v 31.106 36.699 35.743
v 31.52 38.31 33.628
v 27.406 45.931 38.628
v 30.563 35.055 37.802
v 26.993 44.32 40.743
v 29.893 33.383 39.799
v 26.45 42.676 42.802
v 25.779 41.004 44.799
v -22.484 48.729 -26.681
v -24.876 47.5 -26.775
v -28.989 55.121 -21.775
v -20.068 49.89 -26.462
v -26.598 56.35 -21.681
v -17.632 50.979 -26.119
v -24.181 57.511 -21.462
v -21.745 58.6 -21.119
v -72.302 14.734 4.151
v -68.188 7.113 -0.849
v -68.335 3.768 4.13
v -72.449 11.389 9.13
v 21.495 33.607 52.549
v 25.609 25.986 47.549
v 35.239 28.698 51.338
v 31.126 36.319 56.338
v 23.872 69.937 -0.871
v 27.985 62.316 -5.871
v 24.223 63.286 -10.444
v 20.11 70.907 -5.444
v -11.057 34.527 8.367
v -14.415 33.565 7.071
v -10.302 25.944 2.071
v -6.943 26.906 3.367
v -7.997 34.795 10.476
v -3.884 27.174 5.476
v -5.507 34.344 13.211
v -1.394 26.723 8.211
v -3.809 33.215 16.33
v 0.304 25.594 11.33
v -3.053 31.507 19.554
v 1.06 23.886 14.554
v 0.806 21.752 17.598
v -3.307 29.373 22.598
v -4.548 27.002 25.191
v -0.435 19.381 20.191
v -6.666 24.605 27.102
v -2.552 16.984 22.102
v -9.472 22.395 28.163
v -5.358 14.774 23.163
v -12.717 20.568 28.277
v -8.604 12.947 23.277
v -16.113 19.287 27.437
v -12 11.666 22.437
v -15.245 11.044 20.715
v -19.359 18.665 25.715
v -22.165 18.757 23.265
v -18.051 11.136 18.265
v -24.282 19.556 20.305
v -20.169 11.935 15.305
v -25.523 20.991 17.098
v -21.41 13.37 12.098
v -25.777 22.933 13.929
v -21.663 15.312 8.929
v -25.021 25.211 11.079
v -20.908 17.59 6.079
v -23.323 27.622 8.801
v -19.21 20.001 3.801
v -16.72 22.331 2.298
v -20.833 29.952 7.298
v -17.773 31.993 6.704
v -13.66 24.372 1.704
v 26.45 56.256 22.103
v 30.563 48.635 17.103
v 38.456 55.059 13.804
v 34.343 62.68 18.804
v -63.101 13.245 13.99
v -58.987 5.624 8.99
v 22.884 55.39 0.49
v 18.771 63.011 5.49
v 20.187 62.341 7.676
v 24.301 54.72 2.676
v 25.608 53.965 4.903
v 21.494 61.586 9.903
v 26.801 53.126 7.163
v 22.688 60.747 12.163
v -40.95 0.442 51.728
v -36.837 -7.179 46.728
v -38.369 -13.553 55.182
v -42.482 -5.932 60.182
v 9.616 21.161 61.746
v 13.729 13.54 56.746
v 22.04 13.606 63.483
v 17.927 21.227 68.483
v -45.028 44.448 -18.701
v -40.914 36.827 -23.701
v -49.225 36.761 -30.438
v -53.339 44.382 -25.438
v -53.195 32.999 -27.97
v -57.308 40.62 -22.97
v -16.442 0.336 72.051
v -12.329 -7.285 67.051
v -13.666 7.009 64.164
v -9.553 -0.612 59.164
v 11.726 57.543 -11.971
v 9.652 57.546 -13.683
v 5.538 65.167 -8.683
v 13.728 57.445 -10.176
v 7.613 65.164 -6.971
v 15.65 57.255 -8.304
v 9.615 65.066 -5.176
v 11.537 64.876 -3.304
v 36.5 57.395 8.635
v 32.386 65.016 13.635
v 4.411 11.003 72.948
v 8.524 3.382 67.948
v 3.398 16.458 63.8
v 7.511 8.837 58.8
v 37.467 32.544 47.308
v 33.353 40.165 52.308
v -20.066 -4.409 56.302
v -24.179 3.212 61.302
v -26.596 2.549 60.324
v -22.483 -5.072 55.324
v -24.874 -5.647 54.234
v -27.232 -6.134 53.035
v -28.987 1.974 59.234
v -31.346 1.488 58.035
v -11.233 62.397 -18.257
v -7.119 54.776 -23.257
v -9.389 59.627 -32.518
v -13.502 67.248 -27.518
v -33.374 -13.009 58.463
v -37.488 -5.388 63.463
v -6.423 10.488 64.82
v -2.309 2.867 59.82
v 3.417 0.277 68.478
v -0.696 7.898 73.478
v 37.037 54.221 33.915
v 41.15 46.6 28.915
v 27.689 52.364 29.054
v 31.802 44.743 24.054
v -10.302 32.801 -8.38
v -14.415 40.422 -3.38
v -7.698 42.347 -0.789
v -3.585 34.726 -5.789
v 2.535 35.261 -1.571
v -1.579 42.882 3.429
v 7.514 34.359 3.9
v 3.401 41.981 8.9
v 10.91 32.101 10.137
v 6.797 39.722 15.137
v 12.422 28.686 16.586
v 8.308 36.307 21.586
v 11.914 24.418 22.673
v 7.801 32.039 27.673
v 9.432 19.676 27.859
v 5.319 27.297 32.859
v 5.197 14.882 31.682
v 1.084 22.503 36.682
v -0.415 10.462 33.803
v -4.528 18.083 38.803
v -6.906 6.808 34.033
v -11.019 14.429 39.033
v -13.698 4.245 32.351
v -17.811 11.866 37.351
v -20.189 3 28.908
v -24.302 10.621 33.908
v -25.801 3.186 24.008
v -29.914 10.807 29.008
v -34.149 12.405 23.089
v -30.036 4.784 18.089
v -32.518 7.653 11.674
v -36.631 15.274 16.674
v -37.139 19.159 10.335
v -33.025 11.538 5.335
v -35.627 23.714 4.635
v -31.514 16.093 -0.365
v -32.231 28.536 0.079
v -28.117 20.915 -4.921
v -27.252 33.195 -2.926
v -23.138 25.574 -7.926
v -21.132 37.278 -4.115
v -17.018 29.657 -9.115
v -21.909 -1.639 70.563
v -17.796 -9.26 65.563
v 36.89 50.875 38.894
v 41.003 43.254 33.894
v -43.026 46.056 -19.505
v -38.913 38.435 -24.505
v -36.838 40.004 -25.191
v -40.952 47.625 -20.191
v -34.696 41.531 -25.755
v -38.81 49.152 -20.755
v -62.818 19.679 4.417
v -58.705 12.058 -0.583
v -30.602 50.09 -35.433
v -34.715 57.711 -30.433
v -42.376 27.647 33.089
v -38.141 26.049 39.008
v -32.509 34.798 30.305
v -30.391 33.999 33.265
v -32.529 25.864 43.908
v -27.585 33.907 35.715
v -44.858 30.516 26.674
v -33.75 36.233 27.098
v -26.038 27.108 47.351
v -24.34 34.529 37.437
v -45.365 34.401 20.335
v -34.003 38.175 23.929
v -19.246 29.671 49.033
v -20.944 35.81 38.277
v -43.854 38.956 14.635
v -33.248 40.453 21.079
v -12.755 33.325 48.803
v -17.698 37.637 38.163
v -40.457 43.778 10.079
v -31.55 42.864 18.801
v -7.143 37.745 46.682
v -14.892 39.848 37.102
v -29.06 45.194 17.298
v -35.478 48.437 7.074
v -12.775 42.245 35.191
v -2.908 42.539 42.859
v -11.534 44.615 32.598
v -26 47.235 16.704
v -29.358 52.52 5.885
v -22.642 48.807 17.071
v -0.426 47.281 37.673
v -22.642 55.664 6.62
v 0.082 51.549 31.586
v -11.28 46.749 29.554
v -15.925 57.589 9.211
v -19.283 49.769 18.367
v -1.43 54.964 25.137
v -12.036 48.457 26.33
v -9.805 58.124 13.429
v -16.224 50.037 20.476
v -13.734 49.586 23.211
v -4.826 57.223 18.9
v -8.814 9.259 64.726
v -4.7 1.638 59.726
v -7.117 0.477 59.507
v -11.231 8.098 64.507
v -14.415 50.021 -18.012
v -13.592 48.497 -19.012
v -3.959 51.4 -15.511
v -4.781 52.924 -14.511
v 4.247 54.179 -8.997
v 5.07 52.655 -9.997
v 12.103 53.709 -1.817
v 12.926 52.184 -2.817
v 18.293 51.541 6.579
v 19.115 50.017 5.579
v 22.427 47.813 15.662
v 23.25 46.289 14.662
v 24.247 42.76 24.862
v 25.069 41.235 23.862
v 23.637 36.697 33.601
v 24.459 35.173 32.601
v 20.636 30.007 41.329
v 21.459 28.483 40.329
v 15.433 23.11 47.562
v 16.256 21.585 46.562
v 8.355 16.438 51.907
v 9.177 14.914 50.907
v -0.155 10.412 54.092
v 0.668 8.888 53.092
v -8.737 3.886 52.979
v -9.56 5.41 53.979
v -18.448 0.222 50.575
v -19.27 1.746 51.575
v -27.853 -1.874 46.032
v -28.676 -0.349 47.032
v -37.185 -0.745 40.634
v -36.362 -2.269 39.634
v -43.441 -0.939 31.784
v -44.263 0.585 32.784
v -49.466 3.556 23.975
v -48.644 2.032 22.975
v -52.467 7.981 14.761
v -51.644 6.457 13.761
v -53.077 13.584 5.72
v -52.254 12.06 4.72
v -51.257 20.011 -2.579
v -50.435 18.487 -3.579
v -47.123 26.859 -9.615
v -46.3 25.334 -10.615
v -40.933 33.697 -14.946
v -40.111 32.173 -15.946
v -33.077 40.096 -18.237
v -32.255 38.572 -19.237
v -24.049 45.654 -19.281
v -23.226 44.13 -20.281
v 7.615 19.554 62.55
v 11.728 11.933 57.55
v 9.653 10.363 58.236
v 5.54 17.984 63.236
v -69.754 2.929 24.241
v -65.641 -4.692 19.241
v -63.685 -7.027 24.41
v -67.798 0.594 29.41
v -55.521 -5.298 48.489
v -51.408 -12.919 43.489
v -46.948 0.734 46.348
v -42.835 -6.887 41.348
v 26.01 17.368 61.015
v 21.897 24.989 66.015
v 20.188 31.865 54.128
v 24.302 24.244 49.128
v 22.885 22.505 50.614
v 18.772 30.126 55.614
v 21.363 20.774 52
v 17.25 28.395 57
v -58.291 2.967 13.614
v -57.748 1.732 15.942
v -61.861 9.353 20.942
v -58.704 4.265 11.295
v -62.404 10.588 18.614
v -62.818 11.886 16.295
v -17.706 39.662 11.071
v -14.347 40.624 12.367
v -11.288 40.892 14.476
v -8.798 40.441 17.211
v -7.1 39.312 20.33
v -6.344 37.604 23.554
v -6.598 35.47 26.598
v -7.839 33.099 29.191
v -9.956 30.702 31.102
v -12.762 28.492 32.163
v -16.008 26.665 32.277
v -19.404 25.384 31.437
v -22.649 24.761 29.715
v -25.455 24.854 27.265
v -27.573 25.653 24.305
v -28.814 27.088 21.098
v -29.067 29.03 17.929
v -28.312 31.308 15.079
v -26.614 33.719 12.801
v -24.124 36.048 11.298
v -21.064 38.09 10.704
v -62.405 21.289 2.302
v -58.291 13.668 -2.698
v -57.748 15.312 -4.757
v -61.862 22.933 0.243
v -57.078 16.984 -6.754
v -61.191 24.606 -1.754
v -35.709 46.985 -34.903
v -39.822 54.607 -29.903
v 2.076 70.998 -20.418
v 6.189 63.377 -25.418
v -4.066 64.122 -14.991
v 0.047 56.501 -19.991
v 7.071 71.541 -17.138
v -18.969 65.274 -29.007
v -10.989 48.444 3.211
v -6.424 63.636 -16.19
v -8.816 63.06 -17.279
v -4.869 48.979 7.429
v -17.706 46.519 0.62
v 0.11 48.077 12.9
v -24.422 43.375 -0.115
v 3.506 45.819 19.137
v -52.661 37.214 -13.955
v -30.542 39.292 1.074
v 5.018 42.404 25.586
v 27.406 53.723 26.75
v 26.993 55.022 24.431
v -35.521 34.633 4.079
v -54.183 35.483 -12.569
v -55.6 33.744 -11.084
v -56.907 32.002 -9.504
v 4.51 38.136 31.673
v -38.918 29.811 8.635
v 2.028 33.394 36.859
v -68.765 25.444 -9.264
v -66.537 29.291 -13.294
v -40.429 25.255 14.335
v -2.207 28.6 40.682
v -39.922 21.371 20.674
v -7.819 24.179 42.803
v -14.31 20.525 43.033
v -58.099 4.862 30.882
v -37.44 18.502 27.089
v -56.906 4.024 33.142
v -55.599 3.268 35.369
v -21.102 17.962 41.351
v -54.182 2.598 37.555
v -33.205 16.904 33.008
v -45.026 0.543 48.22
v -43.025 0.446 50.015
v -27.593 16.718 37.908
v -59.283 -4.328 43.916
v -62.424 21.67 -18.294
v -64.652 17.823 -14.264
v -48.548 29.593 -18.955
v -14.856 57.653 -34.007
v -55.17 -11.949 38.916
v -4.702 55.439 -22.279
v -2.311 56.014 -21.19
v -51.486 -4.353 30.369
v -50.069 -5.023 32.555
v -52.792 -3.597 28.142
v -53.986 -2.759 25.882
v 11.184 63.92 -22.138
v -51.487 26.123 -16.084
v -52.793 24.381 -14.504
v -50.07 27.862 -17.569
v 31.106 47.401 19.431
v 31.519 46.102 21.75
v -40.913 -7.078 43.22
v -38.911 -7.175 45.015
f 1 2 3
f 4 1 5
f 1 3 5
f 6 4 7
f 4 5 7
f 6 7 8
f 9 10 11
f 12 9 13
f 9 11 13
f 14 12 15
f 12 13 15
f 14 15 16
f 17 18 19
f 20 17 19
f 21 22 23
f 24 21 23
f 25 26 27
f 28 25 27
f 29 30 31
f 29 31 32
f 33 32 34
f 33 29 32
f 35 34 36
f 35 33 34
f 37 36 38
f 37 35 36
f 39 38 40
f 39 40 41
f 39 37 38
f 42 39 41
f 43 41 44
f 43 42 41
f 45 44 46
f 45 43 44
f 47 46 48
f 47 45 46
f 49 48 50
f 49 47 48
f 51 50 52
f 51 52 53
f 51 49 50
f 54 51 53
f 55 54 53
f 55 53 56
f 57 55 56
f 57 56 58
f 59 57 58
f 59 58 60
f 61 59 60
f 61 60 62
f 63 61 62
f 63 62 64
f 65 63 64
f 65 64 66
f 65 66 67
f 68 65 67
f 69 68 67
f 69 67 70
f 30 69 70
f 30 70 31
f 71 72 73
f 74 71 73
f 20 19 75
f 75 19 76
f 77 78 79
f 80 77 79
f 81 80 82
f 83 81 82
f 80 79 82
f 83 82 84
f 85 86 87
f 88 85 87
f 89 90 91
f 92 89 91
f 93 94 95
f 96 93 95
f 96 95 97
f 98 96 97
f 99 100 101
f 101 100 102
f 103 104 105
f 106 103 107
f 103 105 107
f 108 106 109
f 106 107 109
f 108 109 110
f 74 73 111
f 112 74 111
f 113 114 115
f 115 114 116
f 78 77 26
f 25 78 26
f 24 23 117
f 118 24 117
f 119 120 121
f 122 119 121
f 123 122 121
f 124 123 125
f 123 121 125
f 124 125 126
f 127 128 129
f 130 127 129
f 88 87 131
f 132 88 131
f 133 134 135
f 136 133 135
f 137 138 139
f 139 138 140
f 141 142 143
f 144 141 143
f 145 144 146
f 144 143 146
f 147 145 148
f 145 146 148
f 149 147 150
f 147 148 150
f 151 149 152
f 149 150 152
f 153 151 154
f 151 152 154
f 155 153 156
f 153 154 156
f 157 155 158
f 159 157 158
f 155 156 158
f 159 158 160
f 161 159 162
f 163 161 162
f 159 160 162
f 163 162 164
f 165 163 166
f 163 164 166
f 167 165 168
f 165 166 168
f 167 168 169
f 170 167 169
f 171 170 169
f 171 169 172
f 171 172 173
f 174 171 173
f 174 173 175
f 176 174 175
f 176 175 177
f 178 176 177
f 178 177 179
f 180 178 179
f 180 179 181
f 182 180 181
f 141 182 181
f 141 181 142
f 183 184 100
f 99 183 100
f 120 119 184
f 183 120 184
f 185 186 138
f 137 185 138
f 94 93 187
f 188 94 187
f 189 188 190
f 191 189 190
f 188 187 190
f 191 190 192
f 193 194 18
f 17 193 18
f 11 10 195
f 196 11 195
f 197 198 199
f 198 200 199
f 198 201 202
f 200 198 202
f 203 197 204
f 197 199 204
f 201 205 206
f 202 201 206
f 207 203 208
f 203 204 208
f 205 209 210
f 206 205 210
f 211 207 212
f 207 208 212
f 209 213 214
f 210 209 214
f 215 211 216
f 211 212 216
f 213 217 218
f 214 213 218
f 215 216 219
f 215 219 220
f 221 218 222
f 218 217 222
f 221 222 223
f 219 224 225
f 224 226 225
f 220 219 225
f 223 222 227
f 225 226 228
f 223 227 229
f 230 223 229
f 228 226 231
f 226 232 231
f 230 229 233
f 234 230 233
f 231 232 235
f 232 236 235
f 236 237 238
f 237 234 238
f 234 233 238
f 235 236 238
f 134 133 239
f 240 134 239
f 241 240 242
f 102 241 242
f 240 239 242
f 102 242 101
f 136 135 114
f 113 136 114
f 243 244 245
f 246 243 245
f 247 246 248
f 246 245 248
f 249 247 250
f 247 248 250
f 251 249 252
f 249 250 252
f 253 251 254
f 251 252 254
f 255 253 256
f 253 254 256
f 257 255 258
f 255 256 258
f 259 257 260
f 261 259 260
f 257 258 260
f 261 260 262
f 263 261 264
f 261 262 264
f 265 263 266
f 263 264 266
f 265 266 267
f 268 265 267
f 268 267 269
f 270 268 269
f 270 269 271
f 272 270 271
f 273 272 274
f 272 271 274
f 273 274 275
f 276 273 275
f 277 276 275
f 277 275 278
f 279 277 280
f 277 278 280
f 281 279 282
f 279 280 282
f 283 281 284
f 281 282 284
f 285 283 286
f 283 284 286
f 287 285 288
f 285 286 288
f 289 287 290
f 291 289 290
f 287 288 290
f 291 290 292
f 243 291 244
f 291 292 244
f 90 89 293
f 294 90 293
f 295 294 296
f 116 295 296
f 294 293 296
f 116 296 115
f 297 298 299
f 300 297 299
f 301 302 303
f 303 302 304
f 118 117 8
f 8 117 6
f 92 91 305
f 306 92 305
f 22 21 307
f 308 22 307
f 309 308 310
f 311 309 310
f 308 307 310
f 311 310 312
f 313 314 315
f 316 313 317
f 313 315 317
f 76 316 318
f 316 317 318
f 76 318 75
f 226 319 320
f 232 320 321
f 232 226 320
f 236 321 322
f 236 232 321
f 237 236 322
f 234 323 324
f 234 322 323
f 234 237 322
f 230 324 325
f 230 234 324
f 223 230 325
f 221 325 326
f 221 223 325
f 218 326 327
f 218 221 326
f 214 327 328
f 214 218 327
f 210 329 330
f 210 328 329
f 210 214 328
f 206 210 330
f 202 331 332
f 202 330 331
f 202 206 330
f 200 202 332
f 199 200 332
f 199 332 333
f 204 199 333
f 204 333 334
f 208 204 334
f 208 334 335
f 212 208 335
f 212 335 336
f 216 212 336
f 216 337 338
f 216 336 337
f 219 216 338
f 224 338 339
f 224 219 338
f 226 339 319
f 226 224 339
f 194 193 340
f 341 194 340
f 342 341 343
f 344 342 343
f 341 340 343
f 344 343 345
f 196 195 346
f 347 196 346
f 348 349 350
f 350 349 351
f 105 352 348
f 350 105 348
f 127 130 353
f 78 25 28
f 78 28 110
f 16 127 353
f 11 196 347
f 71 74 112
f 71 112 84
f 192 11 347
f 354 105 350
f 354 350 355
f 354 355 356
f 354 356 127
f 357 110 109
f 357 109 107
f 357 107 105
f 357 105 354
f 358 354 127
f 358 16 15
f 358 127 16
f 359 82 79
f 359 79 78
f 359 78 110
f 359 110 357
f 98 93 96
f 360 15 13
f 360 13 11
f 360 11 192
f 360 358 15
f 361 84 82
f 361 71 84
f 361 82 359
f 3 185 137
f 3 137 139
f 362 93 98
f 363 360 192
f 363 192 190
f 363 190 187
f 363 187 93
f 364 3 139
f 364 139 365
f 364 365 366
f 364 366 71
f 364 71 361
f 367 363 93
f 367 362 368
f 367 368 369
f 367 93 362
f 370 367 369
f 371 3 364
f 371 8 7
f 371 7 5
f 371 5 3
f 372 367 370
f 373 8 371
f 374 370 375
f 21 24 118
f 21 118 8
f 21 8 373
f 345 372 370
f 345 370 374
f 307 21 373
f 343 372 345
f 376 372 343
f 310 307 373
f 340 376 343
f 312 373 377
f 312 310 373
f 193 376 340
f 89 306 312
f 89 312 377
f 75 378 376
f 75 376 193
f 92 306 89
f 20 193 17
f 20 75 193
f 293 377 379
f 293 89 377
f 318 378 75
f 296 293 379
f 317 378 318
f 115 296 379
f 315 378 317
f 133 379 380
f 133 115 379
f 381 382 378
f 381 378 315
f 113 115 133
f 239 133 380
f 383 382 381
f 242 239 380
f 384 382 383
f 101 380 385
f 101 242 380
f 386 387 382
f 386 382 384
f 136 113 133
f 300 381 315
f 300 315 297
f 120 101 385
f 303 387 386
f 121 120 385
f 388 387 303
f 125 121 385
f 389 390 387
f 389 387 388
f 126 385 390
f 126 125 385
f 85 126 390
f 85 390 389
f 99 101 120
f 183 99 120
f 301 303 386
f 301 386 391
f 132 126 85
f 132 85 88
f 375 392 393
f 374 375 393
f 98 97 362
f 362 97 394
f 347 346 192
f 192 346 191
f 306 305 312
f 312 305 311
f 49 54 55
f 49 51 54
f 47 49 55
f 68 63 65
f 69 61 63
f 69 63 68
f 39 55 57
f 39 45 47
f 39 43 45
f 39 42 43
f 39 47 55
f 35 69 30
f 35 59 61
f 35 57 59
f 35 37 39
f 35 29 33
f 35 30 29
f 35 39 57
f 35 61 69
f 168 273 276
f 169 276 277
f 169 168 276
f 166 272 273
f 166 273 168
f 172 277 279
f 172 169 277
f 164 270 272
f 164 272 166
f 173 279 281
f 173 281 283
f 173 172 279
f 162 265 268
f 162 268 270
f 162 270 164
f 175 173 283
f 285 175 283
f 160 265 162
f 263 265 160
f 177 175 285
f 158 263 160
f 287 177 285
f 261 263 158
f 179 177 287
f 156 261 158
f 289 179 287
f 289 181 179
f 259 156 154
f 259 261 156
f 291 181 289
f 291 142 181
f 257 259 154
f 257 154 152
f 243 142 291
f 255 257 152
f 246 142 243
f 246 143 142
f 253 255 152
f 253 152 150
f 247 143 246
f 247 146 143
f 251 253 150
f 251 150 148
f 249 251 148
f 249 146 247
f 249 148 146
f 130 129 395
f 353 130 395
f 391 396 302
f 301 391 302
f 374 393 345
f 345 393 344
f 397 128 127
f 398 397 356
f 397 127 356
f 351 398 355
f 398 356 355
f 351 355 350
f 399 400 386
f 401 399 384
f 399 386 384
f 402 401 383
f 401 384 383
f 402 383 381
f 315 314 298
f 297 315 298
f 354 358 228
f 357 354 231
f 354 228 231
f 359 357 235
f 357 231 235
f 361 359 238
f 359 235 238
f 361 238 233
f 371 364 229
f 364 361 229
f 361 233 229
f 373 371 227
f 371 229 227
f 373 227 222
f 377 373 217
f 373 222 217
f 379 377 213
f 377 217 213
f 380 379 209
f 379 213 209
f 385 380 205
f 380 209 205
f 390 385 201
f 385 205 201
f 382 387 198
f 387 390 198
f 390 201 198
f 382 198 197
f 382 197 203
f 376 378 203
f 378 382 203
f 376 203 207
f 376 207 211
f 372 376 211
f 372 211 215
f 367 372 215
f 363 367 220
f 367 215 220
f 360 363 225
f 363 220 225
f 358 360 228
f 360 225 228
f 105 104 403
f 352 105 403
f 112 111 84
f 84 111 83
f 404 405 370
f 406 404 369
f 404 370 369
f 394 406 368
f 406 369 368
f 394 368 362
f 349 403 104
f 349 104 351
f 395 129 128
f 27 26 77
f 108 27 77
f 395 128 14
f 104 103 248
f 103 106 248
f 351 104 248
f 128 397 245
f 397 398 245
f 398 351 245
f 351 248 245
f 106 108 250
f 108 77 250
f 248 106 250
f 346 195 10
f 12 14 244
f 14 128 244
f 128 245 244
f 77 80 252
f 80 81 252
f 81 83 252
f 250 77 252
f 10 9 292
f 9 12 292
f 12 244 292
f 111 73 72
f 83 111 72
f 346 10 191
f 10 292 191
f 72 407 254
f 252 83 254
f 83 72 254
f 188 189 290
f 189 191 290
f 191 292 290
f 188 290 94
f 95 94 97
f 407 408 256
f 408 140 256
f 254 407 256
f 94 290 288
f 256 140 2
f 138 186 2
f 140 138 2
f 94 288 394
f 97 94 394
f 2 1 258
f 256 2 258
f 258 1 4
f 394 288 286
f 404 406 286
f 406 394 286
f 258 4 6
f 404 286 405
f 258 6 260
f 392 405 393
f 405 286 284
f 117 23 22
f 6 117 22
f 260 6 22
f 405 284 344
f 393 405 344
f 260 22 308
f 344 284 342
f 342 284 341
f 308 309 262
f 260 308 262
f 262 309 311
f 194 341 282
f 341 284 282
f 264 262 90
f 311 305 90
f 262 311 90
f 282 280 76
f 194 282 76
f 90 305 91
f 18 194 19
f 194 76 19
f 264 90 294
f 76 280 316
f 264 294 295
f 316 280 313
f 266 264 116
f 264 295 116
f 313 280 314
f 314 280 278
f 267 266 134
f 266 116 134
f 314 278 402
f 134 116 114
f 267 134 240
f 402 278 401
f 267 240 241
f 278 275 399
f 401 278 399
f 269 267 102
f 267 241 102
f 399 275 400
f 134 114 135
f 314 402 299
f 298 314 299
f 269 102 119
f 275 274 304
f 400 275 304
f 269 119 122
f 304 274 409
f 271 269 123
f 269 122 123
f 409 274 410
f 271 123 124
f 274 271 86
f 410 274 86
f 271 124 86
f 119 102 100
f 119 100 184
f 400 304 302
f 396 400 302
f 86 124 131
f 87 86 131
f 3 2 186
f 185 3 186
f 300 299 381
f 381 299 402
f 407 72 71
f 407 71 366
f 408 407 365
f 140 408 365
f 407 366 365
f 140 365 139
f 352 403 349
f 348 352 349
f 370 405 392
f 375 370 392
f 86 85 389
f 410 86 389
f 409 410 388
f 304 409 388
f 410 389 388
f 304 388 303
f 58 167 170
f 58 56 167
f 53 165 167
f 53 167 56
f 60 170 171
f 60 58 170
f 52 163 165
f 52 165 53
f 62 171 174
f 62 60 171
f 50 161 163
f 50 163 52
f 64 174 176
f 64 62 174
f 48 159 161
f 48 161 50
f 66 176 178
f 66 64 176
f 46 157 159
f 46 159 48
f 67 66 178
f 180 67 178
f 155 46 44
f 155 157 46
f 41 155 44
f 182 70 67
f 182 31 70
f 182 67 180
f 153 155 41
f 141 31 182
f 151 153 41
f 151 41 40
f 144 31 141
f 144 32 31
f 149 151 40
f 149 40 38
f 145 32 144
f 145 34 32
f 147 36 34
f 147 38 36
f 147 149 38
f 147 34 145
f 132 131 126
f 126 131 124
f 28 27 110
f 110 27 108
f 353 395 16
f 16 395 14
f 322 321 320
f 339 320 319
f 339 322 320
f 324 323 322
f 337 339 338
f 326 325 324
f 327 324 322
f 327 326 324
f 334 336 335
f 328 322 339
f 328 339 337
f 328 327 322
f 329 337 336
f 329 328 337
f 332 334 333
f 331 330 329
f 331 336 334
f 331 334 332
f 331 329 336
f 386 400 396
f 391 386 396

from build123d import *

# Parameters (mm, degrees)
SKETCH1_R           = 50
EXTRUDE1_DEPTH      = 10
EXTRUDE2_DEPTH      = 10
CIRPATTERN1_COUNT   = 16
SKETCH3_R           = 42.5
CUT_EXTRUDE1_DEPTH  = 2
EXTRUDE3_DEPTH      = 10
EXTRUDE3_DEPTH_BACK = 20
SKETCH4_R           = 25
SKETCH4_R_2         = 12.5


with BuildPart() as part:
    # Sketch1 → Extrude1 (new body)
    with BuildSketch(Plane(origin=(-35.411572528, 65.609323585, -43.044793763), x_dir=(0.661608716570187, 0.6269595397180289, -0.4113339783131309), z_dir=(0.411333978313131, -0.7621052147079792, -0.49999999999999767))):
        with Locations(Location((-35.411572528, 65.609323585, 0), (0, 0, 313.459706489))):
            Circle(SKETCH1_R)
    extrude(amount=EXTRUDE1_DEPTH)

    # Sketch2 → Extrude2 (add)
    with BuildSketch(Plane(origin=(-13.592446481, 25.183609646, 16.522396881), x_dir=(0.661608716570187, 0.6269595397180289, -0.4113339783131309), z_dir=(0.4113339783131311, -0.7621052147079793, -0.4999999999999976))):
        Polygon((-3, 60), (3, 60), (8.358983849, 40), (-8.358983849, 40), align=None)
    extrude2 = extrude(amount=-EXTRUDE2_DEPTH)

    # CirPattern1: Extrude2 ×16 about axis
    cirpattern1_axis = Axis((0, 0, 0), (-0.41133397831313073, 0.7621052147079793, 0.4999999999999978))
    for i in range(1, CIRPATTERN1_COUNT):
        add(extrude2.rotate(cirpattern1_axis, i * 360 / CIRPATTERN1_COUNT))

    # Sketch3 → Cut-Extrude1 (cut)
    with BuildSketch(Plane(origin=(-13.592446481, 25.183609646, 16.522396881), x_dir=(0.661608716570187, 0.6269595397180289, -0.4113339783131309), z_dir=(0.4113339783131311, -0.7621052147079793, -0.4999999999999976))):
        with Locations(Location((0, 0, 0), (0, 0, 313.459706489))):
            Circle(SKETCH3_R)
    extrude(amount=-CUT_EXTRUDE1_DEPTH, mode=Mode.SUBTRACT)

    # Sketch4 → Extrude3 (add, two sides: drawn at the far end of the back side and taken through both)
    with BuildSketch(Plane(origin=(-14.415114438, 26.707820075, 17.522396881), x_dir=(0.661608716570187, 0.626959539718029, -0.41133397831313107), z_dir=(0.4113339783131311, -0.7621052147079793, -0.49999999999999756)).offset(-EXTRUDE3_DEPTH_BACK)):
        with Locations(Location((0, 0, 0), (0, 0, 313.459706489))):
            Circle(SKETCH4_R)
        with Locations(Location((0, 0, 0), (0, 0, 313.459706489))):
            Circle(SKETCH4_R_2, mode=Mode.SUBTRACT)
    extrude(amount=EXTRUDE3_DEPTH + EXTRUDE3_DEPTH_BACK)


solid = part.part
